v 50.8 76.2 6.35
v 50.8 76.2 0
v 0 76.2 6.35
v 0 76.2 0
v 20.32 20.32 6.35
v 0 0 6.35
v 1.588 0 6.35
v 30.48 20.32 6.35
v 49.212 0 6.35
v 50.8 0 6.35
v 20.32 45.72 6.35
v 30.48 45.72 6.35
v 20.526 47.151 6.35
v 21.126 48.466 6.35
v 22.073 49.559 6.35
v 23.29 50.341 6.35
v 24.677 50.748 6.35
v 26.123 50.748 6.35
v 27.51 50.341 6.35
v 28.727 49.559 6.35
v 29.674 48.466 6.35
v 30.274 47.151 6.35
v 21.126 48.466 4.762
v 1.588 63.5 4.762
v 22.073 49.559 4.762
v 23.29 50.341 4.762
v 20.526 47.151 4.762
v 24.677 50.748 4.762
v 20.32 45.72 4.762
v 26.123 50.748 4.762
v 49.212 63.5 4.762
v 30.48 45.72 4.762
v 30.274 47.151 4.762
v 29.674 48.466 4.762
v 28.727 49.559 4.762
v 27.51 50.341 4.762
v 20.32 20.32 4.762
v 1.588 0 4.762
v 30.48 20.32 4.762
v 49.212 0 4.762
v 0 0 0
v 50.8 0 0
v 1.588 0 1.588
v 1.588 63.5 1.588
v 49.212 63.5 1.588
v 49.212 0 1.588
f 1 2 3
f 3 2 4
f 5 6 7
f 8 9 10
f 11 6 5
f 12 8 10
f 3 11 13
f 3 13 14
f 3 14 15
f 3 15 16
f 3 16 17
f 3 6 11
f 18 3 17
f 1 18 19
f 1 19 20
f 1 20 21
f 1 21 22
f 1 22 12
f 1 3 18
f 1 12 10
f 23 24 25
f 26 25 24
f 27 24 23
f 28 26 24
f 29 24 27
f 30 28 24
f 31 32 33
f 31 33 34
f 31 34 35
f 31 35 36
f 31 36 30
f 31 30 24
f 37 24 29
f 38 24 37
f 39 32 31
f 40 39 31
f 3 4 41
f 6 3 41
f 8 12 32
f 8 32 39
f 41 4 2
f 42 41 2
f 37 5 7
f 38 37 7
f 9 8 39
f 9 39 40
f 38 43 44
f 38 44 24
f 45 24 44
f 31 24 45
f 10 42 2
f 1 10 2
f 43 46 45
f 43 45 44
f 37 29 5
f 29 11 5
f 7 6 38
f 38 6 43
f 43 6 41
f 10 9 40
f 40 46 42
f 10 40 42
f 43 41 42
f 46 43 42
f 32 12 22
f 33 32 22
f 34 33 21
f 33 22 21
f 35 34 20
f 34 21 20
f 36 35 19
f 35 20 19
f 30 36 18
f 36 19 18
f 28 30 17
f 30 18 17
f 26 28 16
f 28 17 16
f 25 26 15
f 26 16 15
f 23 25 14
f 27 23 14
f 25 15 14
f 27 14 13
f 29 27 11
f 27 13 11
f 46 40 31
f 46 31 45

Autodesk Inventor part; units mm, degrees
ref_plane "YZ Plane" through (0, 0, 0) normal (1, 0, 0) x (0, 1, 0)
ref_plane "XZ Plane" through (0, 0, 0) normal (0, 1, 0) x (-1, 0, 0)
ref_plane "XY Plane" through (0, 0, 0) normal (0, 0, 1) x (1, 0, 0)
sketch "Sketch1" plane through (0, 0, 0) normal (0, 0, 1) x (1, 0, 0)
  line L0 (0, 0) -> (50.8, 0)
  line L1 (50.8, 0) -> (50.8, 76.2)
  line L2 (50.8, 76.2) -> (0, 76.2)
  line L3 (0, 76.2) -> (0, 0)
  dimension "d0" = 50.8
  dimension "d1" = 76.2
extrude "Extrusion1" add sketch "Sketch1" along normal blind 6.35
sketch "Sketch2" plane through (0, 0, 0) normal (0, -1, 0) x (1, 0, 0)
  line L0 (0, 0) -> (50.8, 0) projected
  line L1 (0, 6.35) -> (50.8, 6.35) projected
  line L2 (0, 0) -> (50.8, 0)
  line L3 (50.8, 0) -> (50.8, 6.35)
  line L4 (50.8, 6.35) -> (0, 6.35)
  line L5 (0, 6.35) -> (0, 0)
  line L6 (49.2125, 4.7625) -> (49.2125, 1.5875)
  line L7 (49.2125, 1.5875) -> (1.5875, 1.5875)
  line L8 (1.5875, 1.5875) -> (1.5875, 4.7625)
  line L9 (1.5875, 4.7625) -> (49.2125, 4.7625)
  dimension "d4" = 1.5875
extrude "Extrusion2" cut sketch "Sketch2" against normal blind 63.5 contours L6 L7 L8 L9
sketch "Sketch3" plane through (0, 0, 6.35) normal (0, 0, 1) x (1, 0, 0)
  line L0 (50.8, 76.2) -> (0, 76.2) projected
  line L1 (25.4, 76.2) -> (25.4, 0)
  line L2 (49.2125, 0) -> (1.5875, 0) projected
  line L3 (30.48, 76.2) -> (30.48, 0)
  line L4 (20.32, 76.2) -> (20.32, 0)
  line L5 (49.2125, 63.5) -> (1.5875, 63.5) projected
  line L6 (25.4, 63.5) -> (25.4, 50.8)
  line L7 (25.4, 50.8) -> (25.4, 45.72)
  circle A0 centre (25.4, 45.72) radius 5.08
  line L8 (30.48, 45.72) -> (30.48, 20.32)
  line L9 (49.2125, 0) -> (49.2125, 63.5) projected
  line L10 (30.48, 20.32) -> (49.2125, 0)
  line L11 (20.32, 45.72) -> (20.32, 20.32)
  line L12 (20.32, 20.32) -> (1.5875, 0)
  point P0 (0, 0)
  dimension "d7" = 5.08
  dimension "d8" = 5.08
  dimension "d9" = 12.7
  dimension "d10" = 5.08
  dimension "d11" = 25.4
  dimension "d12" = 25.4
extrude "Extrusion3" cut sketch "Sketch3" against normal blind 4.7625 contours A0 L1 | L3 L2 L1 A0 | L1 A0 | L10 L2 L3 | L1 L2 L4 A0 | L4 L2 L12
